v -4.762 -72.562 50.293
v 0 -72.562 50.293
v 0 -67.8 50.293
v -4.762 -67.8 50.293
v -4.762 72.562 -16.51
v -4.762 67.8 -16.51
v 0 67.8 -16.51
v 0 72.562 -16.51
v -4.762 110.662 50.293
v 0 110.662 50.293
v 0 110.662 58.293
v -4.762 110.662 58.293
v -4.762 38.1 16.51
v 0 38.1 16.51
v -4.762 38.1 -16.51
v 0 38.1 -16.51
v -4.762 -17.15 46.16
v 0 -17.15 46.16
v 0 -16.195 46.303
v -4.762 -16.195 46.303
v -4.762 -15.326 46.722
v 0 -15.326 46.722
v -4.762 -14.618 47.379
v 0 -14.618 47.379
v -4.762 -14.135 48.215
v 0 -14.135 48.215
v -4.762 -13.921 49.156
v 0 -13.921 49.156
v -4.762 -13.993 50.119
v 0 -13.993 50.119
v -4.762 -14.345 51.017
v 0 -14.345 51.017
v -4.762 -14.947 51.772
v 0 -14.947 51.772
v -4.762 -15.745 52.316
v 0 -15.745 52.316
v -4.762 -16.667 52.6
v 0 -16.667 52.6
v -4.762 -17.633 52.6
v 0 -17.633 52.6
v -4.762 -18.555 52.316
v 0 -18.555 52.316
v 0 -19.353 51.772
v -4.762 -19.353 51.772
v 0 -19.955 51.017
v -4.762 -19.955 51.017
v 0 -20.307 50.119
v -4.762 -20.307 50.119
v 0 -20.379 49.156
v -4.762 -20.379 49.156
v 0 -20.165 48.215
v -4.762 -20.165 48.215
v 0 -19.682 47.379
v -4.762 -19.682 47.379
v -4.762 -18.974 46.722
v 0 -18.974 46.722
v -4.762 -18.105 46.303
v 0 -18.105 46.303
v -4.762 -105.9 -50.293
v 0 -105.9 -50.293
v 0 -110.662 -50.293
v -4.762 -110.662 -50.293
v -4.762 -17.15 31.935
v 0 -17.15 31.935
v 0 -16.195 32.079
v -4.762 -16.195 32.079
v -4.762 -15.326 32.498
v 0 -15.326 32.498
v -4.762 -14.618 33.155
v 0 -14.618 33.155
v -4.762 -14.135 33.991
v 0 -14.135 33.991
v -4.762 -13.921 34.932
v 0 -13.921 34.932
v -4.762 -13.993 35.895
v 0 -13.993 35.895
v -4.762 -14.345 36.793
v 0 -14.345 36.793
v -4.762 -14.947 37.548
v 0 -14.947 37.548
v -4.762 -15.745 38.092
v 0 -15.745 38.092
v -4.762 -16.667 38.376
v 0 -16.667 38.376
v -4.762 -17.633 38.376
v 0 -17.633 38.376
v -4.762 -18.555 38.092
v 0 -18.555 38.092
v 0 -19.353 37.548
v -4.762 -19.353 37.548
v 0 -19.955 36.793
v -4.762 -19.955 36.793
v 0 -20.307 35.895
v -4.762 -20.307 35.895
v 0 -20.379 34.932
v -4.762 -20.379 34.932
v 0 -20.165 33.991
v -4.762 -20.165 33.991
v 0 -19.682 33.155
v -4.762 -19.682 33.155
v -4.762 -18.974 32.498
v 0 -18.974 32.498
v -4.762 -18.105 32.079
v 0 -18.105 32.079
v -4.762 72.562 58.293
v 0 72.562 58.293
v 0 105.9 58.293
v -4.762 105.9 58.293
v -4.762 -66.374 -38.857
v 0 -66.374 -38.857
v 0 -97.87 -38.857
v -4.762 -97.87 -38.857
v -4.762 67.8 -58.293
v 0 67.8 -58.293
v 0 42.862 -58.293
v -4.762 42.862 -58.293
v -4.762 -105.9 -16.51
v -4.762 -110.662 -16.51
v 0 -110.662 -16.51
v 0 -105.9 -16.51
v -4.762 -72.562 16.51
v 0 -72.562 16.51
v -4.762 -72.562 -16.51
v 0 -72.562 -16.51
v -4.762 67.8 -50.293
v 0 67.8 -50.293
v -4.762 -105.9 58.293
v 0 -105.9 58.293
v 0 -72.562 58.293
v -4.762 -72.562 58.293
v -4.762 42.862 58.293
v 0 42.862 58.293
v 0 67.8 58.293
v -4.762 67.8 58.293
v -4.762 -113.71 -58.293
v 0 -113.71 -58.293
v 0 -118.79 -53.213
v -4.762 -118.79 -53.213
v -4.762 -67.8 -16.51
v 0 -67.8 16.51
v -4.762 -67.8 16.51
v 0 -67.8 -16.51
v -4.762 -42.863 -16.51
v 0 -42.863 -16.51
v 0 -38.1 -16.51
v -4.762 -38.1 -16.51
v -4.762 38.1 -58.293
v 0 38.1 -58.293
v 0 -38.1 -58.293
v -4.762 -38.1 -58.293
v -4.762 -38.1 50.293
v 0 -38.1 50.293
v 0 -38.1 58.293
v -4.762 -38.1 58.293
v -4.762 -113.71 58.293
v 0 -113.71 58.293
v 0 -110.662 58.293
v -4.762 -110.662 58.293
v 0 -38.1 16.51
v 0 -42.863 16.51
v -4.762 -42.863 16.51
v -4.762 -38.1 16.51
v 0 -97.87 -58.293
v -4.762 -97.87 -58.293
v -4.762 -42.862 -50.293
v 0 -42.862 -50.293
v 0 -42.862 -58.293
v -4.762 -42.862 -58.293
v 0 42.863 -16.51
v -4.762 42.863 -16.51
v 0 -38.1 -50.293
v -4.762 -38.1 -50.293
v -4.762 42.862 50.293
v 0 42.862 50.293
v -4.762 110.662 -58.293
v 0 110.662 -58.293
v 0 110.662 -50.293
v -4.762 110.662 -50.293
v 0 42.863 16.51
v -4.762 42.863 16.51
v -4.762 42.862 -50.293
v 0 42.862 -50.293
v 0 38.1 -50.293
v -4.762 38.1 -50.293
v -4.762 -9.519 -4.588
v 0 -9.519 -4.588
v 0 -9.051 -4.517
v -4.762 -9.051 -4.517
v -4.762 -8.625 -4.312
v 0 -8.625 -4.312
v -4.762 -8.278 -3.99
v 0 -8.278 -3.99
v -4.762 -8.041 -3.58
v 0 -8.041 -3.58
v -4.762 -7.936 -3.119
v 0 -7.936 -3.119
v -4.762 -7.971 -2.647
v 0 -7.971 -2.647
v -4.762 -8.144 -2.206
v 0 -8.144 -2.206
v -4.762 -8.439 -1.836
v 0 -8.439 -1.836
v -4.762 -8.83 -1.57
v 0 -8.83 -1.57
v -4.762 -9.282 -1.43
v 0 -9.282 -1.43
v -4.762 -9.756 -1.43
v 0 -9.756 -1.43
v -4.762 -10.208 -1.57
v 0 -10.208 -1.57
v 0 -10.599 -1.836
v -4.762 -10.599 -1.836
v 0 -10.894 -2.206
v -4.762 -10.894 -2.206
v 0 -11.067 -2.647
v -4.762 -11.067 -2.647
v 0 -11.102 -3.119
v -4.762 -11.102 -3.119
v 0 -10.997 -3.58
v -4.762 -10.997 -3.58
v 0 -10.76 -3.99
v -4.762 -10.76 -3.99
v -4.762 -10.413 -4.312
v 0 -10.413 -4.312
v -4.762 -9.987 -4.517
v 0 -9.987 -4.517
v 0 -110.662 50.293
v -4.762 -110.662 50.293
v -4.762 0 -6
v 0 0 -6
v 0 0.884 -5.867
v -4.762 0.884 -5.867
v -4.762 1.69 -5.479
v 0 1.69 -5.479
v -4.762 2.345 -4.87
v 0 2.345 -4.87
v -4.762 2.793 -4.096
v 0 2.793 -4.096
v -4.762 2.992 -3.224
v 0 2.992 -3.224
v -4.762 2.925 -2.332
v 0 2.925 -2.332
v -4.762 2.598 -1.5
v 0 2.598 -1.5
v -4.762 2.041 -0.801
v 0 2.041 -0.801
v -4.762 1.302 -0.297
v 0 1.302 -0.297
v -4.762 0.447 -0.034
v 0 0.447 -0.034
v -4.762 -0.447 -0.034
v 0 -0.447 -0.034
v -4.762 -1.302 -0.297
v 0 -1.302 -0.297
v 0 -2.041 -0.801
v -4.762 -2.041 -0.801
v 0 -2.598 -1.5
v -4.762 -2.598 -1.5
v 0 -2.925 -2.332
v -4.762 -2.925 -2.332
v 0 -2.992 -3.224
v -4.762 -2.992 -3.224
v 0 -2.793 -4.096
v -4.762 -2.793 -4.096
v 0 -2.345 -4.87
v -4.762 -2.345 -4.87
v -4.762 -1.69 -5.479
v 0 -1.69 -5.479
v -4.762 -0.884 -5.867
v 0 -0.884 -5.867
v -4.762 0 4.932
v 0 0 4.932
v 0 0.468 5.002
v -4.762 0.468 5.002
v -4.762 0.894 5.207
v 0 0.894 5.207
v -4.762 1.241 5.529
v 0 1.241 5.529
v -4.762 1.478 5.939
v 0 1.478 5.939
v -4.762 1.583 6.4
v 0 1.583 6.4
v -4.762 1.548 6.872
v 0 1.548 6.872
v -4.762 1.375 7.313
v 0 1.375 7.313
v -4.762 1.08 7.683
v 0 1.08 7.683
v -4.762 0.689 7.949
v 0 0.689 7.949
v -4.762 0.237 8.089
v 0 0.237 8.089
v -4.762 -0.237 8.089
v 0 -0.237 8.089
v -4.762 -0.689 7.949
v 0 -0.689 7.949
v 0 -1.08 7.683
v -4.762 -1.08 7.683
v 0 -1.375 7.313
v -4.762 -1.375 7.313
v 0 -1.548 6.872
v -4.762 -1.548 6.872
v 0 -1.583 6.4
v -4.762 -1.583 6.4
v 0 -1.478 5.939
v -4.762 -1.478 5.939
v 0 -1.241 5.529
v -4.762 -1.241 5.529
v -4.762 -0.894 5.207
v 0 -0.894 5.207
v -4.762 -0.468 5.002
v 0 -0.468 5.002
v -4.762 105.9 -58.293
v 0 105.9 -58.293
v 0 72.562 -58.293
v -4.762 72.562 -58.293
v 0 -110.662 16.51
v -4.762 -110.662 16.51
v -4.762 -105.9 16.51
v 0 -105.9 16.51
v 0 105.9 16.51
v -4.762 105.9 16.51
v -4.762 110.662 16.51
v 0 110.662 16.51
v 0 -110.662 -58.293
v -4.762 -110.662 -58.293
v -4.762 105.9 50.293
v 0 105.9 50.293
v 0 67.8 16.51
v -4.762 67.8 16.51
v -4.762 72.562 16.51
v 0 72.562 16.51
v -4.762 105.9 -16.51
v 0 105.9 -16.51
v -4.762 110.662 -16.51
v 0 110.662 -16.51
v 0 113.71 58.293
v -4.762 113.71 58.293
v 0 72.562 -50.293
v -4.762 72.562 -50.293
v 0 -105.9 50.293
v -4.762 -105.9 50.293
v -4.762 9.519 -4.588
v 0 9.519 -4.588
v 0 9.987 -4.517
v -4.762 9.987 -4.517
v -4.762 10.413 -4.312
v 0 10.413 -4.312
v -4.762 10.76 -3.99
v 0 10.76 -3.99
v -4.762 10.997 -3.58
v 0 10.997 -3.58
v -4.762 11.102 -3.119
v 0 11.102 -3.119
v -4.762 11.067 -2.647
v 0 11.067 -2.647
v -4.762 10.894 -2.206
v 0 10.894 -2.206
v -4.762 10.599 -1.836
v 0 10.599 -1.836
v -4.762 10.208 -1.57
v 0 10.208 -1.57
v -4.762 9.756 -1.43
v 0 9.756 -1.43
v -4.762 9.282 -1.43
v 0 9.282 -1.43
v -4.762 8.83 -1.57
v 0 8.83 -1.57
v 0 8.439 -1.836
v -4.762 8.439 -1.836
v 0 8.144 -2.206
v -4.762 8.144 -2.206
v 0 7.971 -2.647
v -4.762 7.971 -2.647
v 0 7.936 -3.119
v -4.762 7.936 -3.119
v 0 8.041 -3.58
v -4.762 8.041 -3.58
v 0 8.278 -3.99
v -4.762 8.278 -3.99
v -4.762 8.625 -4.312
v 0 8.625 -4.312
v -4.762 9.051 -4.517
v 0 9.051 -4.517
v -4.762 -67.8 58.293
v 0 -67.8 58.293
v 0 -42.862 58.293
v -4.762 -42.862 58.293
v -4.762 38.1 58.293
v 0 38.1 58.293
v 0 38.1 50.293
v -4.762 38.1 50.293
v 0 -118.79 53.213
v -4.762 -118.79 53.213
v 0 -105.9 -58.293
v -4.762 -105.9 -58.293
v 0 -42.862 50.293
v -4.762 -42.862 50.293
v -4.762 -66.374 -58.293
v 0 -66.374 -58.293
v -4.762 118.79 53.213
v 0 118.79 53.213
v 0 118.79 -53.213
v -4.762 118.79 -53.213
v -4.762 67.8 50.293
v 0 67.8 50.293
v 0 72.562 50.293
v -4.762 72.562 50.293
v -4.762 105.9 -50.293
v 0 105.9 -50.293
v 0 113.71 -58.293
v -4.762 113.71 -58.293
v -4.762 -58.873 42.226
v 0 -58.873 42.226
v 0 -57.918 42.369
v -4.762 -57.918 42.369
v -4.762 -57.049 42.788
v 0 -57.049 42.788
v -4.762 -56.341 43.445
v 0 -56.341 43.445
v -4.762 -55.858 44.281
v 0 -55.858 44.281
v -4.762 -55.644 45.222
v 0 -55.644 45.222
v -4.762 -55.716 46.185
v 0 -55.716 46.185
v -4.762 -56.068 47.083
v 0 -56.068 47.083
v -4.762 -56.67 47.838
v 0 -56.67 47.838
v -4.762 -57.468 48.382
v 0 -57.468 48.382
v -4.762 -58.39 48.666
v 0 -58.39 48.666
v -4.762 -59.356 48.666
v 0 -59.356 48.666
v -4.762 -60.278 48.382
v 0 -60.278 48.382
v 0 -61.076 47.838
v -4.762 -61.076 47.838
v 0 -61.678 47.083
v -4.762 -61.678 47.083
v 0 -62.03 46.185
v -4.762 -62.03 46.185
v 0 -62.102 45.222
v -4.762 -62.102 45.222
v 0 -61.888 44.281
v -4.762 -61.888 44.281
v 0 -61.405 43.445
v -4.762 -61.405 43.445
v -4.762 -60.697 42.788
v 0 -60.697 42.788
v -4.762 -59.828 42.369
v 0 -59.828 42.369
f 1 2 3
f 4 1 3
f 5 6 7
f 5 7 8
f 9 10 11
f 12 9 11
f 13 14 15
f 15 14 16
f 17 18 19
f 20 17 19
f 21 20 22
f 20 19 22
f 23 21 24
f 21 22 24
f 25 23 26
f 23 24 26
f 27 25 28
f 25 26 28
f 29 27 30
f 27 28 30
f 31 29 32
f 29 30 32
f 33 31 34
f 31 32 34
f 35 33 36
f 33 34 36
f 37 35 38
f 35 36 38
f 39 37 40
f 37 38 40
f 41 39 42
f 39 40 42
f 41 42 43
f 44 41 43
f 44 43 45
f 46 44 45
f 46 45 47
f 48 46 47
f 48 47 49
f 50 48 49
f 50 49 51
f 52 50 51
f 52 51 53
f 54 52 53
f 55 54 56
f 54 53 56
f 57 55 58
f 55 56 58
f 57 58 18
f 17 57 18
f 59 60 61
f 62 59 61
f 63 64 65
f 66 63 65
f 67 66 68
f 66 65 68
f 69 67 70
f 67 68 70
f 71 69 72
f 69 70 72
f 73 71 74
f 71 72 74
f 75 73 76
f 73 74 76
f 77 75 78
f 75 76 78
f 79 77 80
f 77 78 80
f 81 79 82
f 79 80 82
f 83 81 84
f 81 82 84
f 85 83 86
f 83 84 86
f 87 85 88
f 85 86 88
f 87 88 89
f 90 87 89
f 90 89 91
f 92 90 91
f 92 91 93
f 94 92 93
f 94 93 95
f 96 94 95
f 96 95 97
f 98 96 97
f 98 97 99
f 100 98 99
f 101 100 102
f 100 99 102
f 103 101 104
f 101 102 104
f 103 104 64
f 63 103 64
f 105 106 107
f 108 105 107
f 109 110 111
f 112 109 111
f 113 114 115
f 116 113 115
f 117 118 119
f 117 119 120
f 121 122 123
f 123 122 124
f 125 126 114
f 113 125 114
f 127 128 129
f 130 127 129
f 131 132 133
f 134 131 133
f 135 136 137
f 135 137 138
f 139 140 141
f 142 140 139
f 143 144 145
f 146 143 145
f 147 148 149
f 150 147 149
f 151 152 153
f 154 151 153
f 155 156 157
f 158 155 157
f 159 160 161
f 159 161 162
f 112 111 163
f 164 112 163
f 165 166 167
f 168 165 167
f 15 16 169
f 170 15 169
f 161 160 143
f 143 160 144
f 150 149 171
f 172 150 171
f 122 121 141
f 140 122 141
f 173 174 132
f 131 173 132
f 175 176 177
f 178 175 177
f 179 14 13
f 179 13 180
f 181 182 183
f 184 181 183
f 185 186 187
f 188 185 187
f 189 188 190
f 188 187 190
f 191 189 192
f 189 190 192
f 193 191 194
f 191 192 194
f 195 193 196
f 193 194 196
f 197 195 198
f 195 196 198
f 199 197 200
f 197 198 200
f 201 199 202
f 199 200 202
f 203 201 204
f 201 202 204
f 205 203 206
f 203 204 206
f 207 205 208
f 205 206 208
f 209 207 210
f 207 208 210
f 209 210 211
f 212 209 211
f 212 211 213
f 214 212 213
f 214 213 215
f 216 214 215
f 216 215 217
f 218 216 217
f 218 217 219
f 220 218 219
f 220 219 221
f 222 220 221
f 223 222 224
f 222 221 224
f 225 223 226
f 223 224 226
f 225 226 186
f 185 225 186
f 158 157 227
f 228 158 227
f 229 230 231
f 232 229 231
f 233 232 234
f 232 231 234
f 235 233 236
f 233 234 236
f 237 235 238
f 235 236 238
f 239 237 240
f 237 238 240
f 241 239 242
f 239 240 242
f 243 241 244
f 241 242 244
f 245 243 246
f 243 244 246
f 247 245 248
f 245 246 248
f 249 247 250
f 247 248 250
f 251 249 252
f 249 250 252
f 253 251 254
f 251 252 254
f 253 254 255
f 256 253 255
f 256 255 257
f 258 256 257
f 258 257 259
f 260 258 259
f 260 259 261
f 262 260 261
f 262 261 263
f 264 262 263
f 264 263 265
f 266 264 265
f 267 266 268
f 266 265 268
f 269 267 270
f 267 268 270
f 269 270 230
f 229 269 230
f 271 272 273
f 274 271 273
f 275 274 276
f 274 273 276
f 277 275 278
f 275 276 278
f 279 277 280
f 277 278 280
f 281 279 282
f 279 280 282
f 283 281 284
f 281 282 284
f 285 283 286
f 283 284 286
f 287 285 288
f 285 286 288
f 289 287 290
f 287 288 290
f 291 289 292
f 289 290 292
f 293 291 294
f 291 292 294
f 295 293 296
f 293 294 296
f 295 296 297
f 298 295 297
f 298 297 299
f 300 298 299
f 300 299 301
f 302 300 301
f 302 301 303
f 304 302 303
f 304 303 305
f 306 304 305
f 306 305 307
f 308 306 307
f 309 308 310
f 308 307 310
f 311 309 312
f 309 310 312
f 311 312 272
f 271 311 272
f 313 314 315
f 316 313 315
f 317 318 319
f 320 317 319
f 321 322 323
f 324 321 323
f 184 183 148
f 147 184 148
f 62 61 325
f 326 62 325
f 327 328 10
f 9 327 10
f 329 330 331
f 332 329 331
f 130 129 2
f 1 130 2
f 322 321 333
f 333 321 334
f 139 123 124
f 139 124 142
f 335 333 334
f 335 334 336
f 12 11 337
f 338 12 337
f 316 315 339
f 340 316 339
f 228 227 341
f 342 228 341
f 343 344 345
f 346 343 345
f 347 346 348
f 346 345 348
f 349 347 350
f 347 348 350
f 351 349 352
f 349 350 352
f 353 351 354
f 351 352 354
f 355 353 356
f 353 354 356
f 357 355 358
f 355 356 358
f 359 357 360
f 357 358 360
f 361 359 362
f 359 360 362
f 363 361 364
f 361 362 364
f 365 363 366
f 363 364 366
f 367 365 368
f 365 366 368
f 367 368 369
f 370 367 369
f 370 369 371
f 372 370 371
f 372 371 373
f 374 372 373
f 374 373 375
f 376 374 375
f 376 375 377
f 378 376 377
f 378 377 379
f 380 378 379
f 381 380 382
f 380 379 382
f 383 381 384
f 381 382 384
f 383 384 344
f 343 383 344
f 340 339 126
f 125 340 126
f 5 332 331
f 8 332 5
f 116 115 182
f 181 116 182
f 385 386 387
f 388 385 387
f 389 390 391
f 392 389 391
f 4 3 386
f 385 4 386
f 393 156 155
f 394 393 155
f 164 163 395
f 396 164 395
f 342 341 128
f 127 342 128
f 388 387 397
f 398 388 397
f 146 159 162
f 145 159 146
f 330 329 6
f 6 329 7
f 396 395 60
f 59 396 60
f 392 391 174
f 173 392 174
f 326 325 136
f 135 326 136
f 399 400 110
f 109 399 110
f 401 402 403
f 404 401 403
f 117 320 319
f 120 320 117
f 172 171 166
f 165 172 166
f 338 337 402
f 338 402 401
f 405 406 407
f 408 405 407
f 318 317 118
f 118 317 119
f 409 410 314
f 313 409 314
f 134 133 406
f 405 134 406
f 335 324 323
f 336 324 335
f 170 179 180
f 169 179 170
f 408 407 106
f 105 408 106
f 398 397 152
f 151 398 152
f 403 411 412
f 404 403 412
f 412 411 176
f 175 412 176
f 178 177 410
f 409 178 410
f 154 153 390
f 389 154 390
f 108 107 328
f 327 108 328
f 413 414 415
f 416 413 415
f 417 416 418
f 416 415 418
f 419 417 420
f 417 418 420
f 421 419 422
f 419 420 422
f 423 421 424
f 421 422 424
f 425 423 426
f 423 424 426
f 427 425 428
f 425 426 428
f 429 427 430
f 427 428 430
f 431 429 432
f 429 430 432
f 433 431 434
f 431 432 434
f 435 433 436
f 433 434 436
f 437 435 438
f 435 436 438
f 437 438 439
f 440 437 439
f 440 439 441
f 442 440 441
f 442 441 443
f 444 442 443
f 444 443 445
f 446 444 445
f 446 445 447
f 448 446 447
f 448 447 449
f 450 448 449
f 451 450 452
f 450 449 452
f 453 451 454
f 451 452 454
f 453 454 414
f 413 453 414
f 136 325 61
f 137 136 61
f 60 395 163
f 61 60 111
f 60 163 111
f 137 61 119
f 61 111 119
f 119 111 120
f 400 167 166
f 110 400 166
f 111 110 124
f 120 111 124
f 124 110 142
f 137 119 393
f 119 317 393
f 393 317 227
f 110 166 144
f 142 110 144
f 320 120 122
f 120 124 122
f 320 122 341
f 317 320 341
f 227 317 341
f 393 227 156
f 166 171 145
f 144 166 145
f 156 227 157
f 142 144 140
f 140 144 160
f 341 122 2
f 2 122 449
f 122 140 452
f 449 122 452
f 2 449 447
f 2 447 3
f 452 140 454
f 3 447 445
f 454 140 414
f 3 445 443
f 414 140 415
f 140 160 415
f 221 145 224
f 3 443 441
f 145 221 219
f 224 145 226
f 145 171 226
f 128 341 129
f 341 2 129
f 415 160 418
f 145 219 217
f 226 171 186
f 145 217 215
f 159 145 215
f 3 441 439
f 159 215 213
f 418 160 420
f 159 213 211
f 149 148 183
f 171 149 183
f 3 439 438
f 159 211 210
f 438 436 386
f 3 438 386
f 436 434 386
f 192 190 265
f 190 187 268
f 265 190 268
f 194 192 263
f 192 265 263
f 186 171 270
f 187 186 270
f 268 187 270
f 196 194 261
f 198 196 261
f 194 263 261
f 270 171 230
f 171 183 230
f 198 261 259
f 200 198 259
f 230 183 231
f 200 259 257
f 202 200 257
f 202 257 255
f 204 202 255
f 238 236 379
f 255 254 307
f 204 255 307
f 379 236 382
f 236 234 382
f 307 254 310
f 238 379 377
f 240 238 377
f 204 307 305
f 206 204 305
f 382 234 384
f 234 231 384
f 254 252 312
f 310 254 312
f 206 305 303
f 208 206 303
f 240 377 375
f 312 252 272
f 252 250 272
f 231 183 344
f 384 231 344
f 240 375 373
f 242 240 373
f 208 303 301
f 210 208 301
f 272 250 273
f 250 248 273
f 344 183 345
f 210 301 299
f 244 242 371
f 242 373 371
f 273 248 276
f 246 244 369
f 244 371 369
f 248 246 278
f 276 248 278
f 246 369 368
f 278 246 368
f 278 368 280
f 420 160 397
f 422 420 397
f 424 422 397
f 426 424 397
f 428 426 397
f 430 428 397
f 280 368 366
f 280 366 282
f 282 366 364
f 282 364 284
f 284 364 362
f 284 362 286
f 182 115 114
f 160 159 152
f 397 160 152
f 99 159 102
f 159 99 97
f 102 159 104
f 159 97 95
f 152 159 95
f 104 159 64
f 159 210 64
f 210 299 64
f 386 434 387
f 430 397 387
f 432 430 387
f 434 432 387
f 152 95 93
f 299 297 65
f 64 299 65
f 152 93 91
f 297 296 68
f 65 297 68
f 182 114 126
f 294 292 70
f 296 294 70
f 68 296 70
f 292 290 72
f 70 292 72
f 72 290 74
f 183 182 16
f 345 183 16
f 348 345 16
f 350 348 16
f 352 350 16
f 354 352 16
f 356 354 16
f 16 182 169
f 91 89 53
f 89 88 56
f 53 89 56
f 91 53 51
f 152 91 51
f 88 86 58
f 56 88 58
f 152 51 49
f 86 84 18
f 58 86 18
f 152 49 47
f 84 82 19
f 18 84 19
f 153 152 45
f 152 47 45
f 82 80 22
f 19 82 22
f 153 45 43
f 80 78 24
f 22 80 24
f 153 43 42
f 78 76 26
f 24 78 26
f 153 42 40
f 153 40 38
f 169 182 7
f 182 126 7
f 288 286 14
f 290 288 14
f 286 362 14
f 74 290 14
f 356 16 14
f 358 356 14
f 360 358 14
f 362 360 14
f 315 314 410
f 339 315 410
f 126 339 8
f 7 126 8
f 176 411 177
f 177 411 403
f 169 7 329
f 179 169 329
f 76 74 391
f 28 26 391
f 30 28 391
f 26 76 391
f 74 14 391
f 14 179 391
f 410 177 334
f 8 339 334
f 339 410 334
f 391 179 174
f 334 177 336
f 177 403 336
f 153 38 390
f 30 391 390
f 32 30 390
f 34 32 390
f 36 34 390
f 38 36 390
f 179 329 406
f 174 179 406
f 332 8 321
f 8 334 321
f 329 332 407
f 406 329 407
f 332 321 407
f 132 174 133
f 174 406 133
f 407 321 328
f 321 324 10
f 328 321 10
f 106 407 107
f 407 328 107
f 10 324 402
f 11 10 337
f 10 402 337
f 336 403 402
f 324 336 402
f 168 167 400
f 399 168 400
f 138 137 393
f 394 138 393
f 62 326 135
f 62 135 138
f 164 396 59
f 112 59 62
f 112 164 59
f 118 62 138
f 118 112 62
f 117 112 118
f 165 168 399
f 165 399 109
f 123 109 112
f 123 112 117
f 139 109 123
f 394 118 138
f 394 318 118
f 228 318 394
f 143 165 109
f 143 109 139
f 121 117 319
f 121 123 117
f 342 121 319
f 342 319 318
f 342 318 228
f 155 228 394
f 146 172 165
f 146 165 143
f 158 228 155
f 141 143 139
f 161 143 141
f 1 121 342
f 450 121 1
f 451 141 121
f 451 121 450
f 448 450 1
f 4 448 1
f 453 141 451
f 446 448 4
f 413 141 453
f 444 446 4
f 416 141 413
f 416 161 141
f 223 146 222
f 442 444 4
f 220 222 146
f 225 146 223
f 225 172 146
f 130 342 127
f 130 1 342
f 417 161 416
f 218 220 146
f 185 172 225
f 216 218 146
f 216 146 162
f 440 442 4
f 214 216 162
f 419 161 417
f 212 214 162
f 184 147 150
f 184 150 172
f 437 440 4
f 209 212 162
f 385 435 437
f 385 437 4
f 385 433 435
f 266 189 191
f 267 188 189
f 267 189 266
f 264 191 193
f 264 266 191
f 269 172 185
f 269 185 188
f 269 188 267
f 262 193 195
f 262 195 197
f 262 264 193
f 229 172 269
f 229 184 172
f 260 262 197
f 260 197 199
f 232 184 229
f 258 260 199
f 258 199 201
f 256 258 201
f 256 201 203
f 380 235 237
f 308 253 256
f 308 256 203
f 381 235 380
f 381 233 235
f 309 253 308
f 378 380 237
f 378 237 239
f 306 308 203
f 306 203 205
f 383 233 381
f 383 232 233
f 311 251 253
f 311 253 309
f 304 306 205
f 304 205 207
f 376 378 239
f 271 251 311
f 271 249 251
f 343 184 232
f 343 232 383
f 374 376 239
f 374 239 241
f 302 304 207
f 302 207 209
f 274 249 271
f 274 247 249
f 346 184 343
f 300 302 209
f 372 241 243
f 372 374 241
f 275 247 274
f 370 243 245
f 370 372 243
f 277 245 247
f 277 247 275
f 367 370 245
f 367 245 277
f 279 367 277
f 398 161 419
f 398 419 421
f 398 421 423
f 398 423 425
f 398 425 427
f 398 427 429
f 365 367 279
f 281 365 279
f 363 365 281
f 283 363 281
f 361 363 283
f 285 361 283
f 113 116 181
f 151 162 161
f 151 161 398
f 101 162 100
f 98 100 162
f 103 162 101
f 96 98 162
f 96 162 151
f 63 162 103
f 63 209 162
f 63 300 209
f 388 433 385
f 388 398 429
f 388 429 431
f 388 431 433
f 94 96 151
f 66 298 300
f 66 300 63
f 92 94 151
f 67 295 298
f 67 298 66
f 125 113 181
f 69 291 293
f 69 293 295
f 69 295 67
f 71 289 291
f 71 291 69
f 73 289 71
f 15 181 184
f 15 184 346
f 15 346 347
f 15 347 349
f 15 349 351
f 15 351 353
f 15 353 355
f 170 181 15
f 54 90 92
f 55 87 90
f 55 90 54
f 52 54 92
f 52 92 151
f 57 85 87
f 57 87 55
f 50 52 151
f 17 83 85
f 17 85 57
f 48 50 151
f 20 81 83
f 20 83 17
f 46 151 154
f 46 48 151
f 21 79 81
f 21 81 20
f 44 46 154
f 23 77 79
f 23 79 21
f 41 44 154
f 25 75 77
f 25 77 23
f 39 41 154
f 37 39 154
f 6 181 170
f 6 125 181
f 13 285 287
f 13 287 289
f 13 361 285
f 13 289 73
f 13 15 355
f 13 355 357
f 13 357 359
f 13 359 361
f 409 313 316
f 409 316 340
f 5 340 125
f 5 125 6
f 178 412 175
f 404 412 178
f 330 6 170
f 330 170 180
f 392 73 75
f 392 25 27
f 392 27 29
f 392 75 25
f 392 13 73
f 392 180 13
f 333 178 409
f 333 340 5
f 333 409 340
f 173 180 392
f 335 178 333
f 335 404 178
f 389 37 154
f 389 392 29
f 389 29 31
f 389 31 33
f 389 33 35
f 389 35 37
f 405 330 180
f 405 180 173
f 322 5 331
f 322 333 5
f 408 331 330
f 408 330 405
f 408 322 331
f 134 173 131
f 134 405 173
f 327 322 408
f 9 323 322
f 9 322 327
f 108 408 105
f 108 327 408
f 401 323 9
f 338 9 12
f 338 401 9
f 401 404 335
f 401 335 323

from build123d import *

# Parameters (mm, degrees)
SKETCH1_R           = 1.5875
SKETCH1_R_2         = 3
SKETCH1_R_3         = 3.2385
SKETCH1_W           = 33.02
SKETCH1_H           = 4.7625
BOSS_EXTRUDE1_DEPTH = 4.7625
CHAMFER1_SIZE       = 5.08


with BuildPart() as part:
    # Sketch1 → Boss-Extrude1 (new body)
    with BuildSketch(Plane(origin=(0, 0, 0), x_dir=(0, 0, -1), z_dir=(1, 0, 0))):
        Polygon((-58.293, 118.7905), (58.293, 118.7905), (58.293, 110.6625), (50.293, 110.6625), (50.293, 105.9), (58.293, 105.9), (58.293, 72.5625), (50.293, 72.5625), (50.293, 67.8), (58.293, 67.8), (58.293, 42.8625), (50.293, 42.8625), (50.293, 38.1), (58.293, 38.1), (58.293, -38.1), (50.293, -38.1), (50.293, -42.8625), (58.293, -42.8625), (58.293, -66.374), (38.857, -66.374), (38.857, -97.87), (58.293, -97.87), (58.293, -105.9), (50.293, -105.9), (50.293, -110.6625), (58.293, -110.6625), (58.293, -118.7905), (-58.293, -118.7905), (-58.293, -110.6625), (-50.293, -110.6625), (-50.293, -105.9), (-58.293, -105.9), (-58.293, -72.5625), (-50.293, -72.5625), (-50.293, -67.8), (-58.293, -67.8), (-58.293, -42.8625), (-50.293, -42.8625), (-50.293, -38.1), (-58.293, -38.1), (-58.293, 38.1), (-50.293, 38.1), (-50.293, 42.8625), (-58.293, 42.8625), (-58.293, 67.8), (-50.293, 67.8), (-50.293, 72.5625), (-58.293, 72.5625), (-58.293, 105.9), (-50.293, 105.9), (-50.293, 110.6625), (-58.293, 110.6625), align=None)
        with Locations((3, 9.519071488)):
            Circle(SKETCH1_R, mode=Mode.SUBTRACT)
        with Locations((-6.519071488, 0)):
            Circle(SKETCH1_R, mode=Mode.SUBTRACT)
        with Locations((3, -9.519071488)):
            Circle(SKETCH1_R, mode=Mode.SUBTRACT)
        with Locations((3, 0)):
            Circle(SKETCH1_R_2, mode=Mode.SUBTRACT)
        with Locations((-35.174, -17.15)):
            Circle(SKETCH1_R_3, mode=Mode.SUBTRACT)
        with Locations((-49.398, -17.15)):
            Circle(SKETCH1_R_3, mode=Mode.SUBTRACT)
        with Locations((-45.464, -58.872973782)):
            Circle(SKETCH1_R_3, mode=Mode.SUBTRACT)
        with Locations((0, 108.28125)):
            Rectangle(SKETCH1_W, SKETCH1_H, mode=Mode.SUBTRACT)
        with Locations((0, 70.18125)):
            Rectangle(SKETCH1_W, SKETCH1_H, mode=Mode.SUBTRACT)
        with Locations((0, 40.48125)):
            Rectangle(SKETCH1_W, SKETCH1_H, mode=Mode.SUBTRACT)
        with Locations((0, -40.48125)):
            Rectangle(SKETCH1_W, SKETCH1_H, mode=Mode.SUBTRACT)
        with Locations((0, -70.18125)):
            Rectangle(SKETCH1_W, SKETCH1_H, mode=Mode.SUBTRACT)
        with Locations((0, -108.28125)):
            Rectangle(SKETCH1_W, SKETCH1_H, mode=Mode.SUBTRACT)
    extrude(amount=-BOSS_EXTRUDE1_DEPTH)

    # Chamfer1
    chamfer1_edges = [part.edges().sort_by_distance(p)[0] for p in [
        (-2.38125, 118.7905, 58.293),
        (-2.38125, 118.7905, -58.293),
        (-2.38125, -118.7905, -58.293),
        (-2.38125, -118.7905, 58.293),
    ]]
    chamfer(chamfer1_edges, length=CHAMFER1_SIZE)


solid = part.part
